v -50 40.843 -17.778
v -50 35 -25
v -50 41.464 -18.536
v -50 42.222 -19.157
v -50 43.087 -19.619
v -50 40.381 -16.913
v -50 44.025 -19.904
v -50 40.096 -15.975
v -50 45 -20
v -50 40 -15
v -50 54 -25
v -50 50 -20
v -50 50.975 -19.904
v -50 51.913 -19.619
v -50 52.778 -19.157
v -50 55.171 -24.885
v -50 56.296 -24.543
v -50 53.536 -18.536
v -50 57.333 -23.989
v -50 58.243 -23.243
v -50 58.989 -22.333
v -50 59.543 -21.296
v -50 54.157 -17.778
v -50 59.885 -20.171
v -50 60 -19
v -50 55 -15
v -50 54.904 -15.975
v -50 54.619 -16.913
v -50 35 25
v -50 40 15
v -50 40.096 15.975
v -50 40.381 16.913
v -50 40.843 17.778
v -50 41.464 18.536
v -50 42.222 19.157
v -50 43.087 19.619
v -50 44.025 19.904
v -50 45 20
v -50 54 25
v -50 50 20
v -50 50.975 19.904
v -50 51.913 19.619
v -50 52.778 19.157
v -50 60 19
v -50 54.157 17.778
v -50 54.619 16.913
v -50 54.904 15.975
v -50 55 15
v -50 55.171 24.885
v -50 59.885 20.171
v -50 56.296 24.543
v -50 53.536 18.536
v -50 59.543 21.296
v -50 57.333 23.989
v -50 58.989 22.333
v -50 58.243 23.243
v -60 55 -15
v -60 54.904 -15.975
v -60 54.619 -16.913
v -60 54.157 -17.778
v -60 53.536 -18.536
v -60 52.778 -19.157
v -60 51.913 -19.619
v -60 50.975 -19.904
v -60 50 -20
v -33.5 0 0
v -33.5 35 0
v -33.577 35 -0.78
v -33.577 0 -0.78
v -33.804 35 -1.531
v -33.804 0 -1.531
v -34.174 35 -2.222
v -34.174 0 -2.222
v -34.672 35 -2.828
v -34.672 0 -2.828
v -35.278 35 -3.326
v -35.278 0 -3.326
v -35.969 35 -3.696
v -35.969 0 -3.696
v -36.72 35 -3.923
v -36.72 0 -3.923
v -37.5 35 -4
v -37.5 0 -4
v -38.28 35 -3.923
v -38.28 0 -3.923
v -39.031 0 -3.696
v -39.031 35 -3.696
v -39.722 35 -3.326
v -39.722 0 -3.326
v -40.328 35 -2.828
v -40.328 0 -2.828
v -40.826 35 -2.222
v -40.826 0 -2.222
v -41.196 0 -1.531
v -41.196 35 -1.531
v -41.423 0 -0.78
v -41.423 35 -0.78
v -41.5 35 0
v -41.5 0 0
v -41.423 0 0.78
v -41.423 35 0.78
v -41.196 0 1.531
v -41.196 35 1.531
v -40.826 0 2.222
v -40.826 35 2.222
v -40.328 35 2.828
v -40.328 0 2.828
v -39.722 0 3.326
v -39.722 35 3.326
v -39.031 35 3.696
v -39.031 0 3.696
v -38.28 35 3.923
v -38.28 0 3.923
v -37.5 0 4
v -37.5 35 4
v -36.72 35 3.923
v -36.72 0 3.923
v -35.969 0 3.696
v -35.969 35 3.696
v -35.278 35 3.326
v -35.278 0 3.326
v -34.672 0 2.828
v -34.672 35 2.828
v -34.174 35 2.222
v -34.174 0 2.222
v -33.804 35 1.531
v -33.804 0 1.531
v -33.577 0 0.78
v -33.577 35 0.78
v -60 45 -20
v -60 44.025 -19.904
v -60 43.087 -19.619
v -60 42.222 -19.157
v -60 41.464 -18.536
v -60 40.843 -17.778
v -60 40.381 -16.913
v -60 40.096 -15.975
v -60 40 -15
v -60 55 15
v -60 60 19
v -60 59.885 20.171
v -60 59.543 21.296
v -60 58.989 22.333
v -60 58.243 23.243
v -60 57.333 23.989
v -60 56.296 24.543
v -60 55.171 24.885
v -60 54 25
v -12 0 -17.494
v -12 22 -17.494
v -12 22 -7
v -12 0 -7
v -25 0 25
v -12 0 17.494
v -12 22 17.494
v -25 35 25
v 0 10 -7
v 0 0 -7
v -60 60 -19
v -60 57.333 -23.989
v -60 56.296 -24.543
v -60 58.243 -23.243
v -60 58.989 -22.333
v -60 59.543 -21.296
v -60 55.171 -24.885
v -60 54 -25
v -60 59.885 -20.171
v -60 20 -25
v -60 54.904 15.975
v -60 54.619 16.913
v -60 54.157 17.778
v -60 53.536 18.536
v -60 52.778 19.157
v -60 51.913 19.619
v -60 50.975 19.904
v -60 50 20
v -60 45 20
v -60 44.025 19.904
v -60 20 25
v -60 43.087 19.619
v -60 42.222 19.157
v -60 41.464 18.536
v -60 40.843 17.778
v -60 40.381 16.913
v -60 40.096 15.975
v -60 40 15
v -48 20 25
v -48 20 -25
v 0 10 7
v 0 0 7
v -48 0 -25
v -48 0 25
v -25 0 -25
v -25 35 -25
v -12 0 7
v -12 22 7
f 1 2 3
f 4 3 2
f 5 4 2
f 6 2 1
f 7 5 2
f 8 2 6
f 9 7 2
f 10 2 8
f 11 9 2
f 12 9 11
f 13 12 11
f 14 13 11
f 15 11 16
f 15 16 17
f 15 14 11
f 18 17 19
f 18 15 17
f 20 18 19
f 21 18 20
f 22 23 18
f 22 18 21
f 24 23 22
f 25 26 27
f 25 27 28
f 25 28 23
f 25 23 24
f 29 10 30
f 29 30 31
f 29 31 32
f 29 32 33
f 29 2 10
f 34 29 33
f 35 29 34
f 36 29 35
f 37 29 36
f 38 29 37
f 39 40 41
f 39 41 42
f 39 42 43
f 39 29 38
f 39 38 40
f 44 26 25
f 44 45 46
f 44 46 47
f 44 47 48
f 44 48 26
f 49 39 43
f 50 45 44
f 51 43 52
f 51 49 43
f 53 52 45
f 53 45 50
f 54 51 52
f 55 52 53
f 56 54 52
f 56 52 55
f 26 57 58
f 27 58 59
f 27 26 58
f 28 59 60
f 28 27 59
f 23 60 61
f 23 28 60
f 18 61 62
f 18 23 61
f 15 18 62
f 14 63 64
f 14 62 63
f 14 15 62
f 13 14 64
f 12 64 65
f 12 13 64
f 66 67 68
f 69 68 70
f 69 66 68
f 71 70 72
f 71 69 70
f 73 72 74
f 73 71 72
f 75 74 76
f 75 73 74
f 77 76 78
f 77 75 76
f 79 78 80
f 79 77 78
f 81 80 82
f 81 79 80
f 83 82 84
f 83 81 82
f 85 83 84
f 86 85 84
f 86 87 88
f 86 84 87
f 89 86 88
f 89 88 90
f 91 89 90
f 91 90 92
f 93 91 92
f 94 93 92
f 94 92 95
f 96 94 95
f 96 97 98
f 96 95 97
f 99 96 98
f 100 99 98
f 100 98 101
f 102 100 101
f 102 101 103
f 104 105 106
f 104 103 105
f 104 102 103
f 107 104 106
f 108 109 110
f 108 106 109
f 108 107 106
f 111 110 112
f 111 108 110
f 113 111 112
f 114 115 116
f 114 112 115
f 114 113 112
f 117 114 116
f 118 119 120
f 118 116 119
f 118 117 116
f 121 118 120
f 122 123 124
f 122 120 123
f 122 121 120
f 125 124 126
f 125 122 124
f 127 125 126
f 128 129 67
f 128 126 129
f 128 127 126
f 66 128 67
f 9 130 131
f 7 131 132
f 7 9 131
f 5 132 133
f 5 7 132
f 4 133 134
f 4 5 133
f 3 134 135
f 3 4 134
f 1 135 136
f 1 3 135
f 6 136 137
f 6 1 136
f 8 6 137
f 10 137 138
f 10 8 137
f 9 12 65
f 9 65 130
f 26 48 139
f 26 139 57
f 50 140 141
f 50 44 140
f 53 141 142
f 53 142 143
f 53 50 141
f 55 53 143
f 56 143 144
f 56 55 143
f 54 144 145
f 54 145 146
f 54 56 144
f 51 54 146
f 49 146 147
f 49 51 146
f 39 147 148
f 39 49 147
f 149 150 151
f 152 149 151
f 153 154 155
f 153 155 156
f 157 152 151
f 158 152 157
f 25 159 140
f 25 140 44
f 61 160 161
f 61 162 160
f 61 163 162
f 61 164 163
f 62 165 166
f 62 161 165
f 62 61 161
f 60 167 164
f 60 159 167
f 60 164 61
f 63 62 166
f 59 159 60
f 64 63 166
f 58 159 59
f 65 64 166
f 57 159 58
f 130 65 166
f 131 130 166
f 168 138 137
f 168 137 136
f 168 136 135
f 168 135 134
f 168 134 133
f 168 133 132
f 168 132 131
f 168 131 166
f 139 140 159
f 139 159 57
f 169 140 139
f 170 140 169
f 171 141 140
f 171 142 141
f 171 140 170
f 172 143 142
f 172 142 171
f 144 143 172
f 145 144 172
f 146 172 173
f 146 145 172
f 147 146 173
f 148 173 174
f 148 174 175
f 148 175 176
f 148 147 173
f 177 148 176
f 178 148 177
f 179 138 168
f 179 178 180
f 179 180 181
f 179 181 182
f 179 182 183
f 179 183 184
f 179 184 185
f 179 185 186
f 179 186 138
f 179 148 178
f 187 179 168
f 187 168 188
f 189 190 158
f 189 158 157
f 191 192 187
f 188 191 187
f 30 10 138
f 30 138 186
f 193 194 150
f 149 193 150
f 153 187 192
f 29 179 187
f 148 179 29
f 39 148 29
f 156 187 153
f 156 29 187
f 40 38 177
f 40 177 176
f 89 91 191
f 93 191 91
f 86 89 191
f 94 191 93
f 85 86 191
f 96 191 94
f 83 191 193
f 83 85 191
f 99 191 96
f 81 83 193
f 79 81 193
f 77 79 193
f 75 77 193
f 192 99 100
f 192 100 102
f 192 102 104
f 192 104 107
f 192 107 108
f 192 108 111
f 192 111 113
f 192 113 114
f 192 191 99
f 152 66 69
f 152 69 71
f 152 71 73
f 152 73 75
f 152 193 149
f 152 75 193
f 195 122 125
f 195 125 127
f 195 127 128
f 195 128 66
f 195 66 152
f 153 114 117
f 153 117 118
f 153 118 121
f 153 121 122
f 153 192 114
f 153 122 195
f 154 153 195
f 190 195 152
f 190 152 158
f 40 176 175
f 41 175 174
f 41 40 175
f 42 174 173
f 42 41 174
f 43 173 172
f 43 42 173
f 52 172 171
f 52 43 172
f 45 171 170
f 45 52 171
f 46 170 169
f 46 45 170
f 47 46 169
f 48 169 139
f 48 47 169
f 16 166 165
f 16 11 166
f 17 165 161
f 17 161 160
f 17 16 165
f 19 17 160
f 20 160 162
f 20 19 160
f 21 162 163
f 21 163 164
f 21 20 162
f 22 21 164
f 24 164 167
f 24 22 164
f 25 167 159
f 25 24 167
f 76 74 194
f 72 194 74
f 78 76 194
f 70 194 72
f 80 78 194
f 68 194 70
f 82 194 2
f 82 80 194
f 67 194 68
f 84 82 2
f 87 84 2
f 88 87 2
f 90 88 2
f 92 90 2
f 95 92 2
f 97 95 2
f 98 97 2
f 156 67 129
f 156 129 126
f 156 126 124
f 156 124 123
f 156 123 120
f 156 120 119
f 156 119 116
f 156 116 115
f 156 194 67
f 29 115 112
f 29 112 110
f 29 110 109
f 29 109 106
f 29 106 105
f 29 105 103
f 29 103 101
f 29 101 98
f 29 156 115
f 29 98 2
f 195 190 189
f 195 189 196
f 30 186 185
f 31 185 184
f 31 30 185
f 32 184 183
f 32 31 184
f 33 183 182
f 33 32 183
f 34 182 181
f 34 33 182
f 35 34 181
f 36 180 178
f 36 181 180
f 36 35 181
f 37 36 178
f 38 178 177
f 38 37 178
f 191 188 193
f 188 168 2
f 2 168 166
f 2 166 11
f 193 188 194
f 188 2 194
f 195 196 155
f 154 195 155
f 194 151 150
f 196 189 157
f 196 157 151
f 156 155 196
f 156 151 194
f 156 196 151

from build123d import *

# Parameters (mm, degrees)
BOSS_EXTRUDE1_DEPTH = 25
SKETCH3_R           = 4
CUT_EXTRUDE2_DEPTH  = 89.459030065
CUT_EXTRUDE3_DEPTH  = 89.459030065
CUT_EXTRUDE4_DEPTH  = 89.459030065
CUT_EXTRUDE5_DEPTH  = 83.006097334
FILLET1_R           = 6


with BuildPart() as part:
    # Sketch2 → Boss-Extrude1 (new, symmetric)
    with BuildSketch(Plane.XY):
        Polygon((0, 10), (-25, 35), (-50, 35), (-50, 60), (-60, 60), (-60, 20), (-48, 20), (-48, 0), (0, 0), align=None)
    extrude(amount=BOSS_EXTRUDE1_DEPTH, both=True)

    # Sketch3 → Cut-Extrude2 (cut, through all)
    with BuildSketch(Plane(origin=(0, 0, 0), x_dir=(1, 0, 0), z_dir=(0, 1, 0))):
        with Locations((-37.5, 0)):
            Circle(SKETCH3_R)
    extrude(amount=CUT_EXTRUDE2_DEPTH, mode=Mode.SUBTRACT)

    # Sketch3<5> → Cut-Extrude3 (cut, through all)
    with BuildSketch(Plane(origin=(0, 0, 0), x_dir=(1, 0, 0), z_dir=(0, 1, 0))):
        Polygon((0, 25), (-25, 25), (0, 10.56624327), align=None)
        Polygon((0, -10.56624327), (-25, -25), (0, -25), align=None)
    extrude(amount=CUT_EXTRUDE3_DEPTH, mode=Mode.SUBTRACT)

    # Sketch3<6> → Cut-Extrude4 (cut, through all)
    with BuildSketch(Plane(origin=(0, 0, 0), x_dir=(1, 0, 0), z_dir=(0, 1, 0))):
        Polygon((0, 10.56624327), (-12, 17.494446501), (-12, 7), (0, 7), align=None)
        Polygon((-12, -7), (-12, -17.494446501), (0, -10.56624327), (0, -7), align=None)
    extrude(amount=CUT_EXTRUDE4_DEPTH, mode=Mode.SUBTRACT)

    # Sketch6 → Cut-Extrude5 (cut, through all)
    with BuildSketch(Plane(origin=(-50, 0, 0), x_dir=(0, 0, -1), z_dir=(1, 0, 0))):
        with BuildLine():
            Line((-15, 55), (15, 55))
            ThreePointArc((15, 55), (18.535533906, 53.535533906), (20, 50))
            Line((20, 50), (20, 45))
            ThreePointArc((20, 45), (18.535533906, 41.464466094), (15, 40))
            Line((15, 40), (-15, 40))
            ThreePointArc((-15, 40), (-18.535533906, 41.464466094), (-20, 45))
            Line((-20, 45), (-20, 50))
            ThreePointArc((-20, 50), (-18.535533906, 53.535533906), (-15, 55))
        make_face()
    extrude(amount=-CUT_EXTRUDE5_DEPTH, mode=Mode.SUBTRACT)

    # Fillet1
    fillet1_edges = [part.edges().sort_by_distance(p)[0] for p in [
        (-55, 60, -25),
        (-55, 60, 25),
    ]]
    fillet(fillet1_edges, radius=FILLET1_R)


solid = part.part
